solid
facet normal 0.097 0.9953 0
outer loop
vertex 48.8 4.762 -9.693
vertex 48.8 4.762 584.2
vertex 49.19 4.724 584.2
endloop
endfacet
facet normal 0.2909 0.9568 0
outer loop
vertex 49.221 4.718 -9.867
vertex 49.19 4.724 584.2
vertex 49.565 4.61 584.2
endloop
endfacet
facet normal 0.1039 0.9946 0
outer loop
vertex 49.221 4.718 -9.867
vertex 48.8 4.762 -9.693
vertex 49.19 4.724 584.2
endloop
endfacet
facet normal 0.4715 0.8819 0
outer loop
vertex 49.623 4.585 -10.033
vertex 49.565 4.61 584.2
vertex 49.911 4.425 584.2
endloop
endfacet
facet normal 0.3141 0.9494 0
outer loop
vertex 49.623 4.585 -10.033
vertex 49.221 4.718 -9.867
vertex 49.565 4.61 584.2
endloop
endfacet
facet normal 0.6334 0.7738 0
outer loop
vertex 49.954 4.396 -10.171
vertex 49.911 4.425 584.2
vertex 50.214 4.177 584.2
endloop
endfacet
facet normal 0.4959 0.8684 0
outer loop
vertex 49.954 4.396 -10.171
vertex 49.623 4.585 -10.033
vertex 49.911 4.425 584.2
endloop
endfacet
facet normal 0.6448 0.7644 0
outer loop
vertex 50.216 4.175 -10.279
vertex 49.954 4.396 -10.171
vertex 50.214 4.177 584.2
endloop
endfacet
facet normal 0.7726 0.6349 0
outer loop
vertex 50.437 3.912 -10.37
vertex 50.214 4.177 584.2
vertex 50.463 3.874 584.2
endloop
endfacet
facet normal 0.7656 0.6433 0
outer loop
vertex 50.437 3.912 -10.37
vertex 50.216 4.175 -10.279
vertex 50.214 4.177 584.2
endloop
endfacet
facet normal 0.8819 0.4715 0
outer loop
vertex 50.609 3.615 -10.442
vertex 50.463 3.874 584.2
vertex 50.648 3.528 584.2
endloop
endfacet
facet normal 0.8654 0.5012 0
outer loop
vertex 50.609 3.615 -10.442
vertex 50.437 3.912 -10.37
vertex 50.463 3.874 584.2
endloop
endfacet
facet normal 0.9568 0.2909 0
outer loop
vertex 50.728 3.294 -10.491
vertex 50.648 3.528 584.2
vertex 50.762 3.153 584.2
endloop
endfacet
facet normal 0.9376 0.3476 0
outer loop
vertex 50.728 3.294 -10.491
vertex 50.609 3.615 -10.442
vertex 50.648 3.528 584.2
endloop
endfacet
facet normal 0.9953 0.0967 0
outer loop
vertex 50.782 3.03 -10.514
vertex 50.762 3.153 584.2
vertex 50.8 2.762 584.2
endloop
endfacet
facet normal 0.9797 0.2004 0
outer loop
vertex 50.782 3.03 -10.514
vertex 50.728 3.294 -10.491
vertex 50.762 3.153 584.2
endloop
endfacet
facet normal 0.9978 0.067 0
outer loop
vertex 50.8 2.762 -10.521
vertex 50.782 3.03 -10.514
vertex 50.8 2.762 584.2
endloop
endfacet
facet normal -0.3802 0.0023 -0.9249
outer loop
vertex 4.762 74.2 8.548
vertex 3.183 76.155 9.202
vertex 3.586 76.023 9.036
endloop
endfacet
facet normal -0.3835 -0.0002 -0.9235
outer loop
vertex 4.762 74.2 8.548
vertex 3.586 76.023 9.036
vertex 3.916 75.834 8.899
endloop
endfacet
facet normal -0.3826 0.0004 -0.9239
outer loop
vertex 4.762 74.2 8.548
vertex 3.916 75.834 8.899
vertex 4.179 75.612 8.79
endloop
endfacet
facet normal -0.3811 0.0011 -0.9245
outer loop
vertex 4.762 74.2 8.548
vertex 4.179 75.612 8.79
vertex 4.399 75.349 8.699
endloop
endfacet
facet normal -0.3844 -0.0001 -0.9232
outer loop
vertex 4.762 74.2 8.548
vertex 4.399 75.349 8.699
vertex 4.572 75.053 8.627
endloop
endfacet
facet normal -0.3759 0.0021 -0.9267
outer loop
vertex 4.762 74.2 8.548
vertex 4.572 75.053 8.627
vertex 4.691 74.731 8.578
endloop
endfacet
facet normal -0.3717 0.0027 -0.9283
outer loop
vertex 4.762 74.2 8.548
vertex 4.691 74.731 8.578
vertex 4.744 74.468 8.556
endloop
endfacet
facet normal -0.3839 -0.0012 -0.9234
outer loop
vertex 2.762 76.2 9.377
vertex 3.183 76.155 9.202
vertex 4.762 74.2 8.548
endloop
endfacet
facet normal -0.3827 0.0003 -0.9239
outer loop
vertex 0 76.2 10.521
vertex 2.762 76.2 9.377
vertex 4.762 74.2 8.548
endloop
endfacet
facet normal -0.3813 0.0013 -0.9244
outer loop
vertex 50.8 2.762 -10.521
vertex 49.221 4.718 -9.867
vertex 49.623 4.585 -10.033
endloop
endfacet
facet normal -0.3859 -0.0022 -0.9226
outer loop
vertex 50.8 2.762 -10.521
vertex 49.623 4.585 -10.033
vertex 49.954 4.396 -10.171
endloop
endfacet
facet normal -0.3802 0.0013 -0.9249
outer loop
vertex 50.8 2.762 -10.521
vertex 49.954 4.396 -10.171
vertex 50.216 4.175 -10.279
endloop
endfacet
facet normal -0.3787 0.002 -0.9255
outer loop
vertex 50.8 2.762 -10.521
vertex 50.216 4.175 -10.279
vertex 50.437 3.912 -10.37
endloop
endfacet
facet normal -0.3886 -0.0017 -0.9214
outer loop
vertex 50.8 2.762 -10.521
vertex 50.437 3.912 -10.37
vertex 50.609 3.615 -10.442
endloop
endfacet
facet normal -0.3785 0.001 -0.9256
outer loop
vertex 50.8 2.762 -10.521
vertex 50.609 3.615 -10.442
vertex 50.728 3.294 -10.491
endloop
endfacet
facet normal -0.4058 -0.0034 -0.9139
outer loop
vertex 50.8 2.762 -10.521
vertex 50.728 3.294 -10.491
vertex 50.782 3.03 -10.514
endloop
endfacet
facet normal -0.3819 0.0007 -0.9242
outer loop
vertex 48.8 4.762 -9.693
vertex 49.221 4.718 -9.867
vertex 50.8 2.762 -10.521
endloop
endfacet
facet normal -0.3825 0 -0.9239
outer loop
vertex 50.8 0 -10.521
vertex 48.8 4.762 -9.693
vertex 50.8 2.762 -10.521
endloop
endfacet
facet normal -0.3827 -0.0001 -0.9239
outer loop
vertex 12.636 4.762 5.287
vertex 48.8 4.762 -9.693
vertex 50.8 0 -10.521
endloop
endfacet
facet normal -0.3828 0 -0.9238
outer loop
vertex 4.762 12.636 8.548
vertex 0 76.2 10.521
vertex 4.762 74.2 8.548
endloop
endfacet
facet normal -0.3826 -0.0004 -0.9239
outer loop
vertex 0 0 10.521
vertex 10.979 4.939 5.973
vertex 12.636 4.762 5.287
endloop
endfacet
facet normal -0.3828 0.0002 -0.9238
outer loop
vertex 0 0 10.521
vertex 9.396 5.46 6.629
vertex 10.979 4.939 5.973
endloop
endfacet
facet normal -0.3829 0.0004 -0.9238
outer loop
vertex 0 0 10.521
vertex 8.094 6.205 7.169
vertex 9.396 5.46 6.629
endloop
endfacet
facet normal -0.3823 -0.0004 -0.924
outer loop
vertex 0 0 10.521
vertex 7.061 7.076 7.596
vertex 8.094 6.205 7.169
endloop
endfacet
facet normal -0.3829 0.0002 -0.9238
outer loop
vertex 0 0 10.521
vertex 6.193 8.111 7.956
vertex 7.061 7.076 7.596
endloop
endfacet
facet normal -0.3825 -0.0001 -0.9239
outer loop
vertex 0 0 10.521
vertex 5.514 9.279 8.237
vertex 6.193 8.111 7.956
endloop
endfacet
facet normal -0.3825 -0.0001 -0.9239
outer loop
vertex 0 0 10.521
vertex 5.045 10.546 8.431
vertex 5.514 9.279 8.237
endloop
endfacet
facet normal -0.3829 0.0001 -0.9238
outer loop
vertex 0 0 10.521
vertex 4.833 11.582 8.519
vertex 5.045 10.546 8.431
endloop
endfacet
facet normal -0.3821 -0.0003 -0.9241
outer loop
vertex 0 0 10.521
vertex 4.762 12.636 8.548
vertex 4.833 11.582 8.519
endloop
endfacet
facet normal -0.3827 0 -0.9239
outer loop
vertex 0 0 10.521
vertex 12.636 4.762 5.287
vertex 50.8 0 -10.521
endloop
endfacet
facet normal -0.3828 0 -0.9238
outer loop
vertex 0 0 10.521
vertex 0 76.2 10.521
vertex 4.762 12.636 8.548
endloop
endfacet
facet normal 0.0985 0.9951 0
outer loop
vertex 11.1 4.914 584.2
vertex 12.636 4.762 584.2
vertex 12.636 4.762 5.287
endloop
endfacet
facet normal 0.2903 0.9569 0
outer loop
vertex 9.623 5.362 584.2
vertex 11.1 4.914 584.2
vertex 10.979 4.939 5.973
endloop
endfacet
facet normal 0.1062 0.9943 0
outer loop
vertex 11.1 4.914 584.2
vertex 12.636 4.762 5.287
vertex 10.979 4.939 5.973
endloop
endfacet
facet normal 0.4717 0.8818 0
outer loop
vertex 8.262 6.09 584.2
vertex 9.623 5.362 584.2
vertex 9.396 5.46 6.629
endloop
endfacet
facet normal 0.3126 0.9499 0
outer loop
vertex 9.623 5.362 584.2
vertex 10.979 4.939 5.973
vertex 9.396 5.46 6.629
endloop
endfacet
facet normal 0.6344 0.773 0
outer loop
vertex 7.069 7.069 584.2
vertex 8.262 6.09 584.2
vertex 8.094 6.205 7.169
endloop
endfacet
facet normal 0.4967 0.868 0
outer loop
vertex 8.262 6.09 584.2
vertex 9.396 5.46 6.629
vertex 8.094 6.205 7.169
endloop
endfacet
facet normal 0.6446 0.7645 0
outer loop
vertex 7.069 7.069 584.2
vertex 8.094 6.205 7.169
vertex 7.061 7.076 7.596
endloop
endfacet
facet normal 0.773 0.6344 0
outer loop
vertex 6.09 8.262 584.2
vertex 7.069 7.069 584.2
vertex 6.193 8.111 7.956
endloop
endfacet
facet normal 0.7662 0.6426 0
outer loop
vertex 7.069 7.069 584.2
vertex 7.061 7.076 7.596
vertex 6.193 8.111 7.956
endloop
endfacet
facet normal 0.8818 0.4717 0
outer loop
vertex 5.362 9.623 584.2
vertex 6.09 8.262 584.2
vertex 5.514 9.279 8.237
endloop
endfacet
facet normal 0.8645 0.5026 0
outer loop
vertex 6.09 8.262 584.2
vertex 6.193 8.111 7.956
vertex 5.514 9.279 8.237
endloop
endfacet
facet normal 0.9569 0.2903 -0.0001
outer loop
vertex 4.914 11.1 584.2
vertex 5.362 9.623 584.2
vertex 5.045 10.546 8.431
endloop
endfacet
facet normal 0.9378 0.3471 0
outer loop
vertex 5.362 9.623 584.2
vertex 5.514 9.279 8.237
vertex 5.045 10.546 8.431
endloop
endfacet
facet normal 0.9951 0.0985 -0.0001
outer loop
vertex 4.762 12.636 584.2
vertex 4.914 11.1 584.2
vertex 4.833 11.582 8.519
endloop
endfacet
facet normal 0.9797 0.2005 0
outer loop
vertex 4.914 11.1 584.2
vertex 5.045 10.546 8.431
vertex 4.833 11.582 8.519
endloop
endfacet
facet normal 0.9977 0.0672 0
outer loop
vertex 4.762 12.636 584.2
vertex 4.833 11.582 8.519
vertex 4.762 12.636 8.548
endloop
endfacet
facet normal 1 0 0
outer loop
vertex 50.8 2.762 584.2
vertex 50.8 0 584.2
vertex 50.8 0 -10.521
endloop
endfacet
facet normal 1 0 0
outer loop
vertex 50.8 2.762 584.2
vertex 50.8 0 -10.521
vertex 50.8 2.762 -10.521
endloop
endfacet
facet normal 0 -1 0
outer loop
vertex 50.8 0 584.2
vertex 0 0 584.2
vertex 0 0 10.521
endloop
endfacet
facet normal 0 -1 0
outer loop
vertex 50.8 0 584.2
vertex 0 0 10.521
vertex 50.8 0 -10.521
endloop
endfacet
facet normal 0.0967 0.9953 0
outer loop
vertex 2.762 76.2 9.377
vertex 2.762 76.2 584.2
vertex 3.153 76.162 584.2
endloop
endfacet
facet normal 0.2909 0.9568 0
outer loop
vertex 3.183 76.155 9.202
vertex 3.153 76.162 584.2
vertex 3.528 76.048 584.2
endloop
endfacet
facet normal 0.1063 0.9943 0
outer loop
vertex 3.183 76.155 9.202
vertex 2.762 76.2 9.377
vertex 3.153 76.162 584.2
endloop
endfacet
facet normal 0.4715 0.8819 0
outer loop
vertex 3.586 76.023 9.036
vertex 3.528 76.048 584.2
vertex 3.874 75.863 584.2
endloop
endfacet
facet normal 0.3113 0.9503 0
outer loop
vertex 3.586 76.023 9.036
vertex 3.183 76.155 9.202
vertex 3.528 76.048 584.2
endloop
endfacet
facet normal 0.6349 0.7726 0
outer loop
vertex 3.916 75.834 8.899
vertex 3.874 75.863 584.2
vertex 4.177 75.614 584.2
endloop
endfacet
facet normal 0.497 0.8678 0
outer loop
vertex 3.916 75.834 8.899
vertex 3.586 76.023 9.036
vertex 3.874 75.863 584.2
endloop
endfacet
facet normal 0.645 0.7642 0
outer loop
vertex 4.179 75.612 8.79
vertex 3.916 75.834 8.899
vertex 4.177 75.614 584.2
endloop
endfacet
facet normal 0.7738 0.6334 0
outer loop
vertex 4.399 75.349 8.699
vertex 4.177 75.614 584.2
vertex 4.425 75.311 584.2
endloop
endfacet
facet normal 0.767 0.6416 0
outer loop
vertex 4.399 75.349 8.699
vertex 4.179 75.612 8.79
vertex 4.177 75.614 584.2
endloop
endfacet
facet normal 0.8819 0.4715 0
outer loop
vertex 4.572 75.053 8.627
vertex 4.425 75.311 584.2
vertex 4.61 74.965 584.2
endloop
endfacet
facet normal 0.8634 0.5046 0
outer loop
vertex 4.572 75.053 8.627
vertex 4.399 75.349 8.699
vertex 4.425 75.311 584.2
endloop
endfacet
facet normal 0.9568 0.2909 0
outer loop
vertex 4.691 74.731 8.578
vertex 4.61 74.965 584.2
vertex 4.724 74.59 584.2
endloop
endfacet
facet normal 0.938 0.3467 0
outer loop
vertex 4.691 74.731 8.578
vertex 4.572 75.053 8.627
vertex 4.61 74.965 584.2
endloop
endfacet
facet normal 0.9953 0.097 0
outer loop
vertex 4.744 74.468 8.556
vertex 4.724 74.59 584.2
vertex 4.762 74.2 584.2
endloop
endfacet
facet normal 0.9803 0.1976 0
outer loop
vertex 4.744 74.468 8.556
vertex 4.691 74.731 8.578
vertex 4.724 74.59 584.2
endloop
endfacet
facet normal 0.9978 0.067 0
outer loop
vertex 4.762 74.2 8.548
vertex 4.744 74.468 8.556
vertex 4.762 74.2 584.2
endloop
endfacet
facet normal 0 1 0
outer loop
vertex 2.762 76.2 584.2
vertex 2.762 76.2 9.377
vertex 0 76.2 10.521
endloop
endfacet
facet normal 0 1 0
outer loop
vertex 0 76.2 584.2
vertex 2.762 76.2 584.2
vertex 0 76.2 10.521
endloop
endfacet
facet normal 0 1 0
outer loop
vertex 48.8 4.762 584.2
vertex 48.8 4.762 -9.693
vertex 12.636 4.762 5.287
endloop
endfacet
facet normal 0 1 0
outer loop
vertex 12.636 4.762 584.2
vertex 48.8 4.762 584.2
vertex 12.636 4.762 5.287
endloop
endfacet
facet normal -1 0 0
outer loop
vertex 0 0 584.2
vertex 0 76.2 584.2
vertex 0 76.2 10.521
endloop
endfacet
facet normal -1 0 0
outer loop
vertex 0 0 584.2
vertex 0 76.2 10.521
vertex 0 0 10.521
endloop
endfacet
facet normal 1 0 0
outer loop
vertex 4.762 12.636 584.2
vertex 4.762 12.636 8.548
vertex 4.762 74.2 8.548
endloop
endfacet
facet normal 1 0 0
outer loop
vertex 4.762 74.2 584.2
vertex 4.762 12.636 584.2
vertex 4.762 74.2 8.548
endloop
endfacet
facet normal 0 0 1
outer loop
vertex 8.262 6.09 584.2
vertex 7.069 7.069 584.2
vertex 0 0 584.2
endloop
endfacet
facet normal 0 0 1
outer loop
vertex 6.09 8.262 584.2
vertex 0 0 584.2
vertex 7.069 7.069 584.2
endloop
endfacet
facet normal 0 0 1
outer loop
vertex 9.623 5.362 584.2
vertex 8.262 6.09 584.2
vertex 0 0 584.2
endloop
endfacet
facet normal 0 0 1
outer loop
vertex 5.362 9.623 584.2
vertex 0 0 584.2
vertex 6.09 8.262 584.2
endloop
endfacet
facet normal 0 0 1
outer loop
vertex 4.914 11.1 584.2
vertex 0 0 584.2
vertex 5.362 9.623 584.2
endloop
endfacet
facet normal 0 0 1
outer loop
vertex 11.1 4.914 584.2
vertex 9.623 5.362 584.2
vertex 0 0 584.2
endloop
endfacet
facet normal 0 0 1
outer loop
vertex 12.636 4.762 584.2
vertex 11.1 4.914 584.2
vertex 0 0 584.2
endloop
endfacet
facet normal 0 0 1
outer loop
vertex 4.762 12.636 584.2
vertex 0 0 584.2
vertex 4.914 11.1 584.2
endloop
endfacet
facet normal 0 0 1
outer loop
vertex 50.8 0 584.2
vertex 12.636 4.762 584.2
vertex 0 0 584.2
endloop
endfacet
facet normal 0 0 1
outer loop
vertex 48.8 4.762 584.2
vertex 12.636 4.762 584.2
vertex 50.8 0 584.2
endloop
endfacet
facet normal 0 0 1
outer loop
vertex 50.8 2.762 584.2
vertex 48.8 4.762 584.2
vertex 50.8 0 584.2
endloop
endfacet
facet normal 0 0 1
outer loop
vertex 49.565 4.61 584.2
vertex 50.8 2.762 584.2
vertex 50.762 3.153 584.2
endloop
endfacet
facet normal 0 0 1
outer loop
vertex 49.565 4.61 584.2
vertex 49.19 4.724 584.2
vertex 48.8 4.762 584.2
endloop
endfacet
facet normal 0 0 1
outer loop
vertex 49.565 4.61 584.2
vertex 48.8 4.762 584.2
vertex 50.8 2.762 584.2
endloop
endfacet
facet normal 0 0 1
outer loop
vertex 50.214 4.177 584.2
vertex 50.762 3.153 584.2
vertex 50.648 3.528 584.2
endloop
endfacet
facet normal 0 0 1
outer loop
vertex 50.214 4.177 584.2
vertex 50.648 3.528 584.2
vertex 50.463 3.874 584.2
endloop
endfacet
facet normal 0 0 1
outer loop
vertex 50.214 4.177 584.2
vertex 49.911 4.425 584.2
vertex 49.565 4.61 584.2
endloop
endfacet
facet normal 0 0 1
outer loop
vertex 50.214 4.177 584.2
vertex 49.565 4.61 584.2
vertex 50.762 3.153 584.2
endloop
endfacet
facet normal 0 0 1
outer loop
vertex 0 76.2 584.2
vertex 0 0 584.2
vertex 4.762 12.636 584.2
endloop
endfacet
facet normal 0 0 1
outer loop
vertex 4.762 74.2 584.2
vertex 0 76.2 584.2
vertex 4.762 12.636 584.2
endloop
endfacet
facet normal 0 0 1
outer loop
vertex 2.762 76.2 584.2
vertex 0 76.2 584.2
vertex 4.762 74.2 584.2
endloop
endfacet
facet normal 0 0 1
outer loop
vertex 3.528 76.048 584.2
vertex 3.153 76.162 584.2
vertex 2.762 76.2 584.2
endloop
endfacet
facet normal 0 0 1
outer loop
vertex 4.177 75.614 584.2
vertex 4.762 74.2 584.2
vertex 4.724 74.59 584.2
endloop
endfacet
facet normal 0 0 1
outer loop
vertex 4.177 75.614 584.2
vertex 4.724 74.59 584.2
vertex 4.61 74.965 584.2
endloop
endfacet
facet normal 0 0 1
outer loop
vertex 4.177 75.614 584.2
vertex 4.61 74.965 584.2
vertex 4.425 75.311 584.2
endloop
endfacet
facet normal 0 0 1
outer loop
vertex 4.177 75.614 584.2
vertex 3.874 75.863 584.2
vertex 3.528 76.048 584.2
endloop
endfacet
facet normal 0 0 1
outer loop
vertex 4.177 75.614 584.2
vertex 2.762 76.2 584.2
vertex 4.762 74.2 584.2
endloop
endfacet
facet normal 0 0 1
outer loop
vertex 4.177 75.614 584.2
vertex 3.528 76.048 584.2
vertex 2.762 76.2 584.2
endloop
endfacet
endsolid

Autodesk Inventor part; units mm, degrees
ref_plane "Start plane" through (0, 0, -10.521) normal (0, 0, 1) x (1, 0, 0)
ref_plane "End plane" through (0, 0, 584.2) normal (0, 0, 1) x (1, 0, 0)
sketch "Sketch" plane through (0, 0, 0) normal (0, 0, 1) x (1, 0, 0)
  line L0 (0, 76.2) -> (0, 0)
  line L1 (0, 0) -> (50.8, 0)
  line L2 (50.8, 0) -> (50.8, 2.7625)
  line L3 (48.8, 4.7625) -> (12.6365, 4.7625)
  line L4 (4.7625, 12.6365) -> (4.7625, 74.2)
  line L5 (2.7625, 76.2) -> (0, 76.2)
  line L6 (-7.0414, 0) -> (21.5385, 0) construction
  line L7 (0, -8.0414) -> (0, 34.5385) construction
  arc A0 (4.7625, 12.6365) -> (12.6365, 4.7625) centre (12.6365, 12.6365) ccw
  arc A1 (50.8, 2.7625) -> (48.8, 4.7625) centre (48.8, 2.7625) ccw
  arc A2 (4.7625, 74.2) -> (2.7625, 76.2) centre (2.7625, 74.2) ccw
  line L8 (0, 93.5453) -> (0, -24.9725) construction
  line L9 (-18.6925, 0) -> (62.8653, 0) construction
  point P0 (50.8, 4.7625)
  point P1 (4.7625, 4.7625)
  point P2 (4.7625, 76.2)
  dimension "d12" = 4.7625
  dimension "d13" = 76.2
  dimension "d14" = 50.8
  dimension "d15" = 0
  dimension "d16" = 4.7625
  dimension "d17" = 0
  dimension "d18" = 7.874
  dimension "d19" = 2
extrude "Body" add sketch "Sketch" along normal up to surface (594.721 mm away) from surface at -10.521
sketch "Sketch3" plane through (0, 0, 0) normal (0, 0, 1) x (1, 0, 0)
  line L0 (0, 0) -> (10, 0)
ref_plane "Work Plane5" through (0, 0, 0) normal (0, -1, 0) x (1, 0, 0)
sketch "Sketch4" plane through (0, 0, 0) normal (0, -1, 0) x (1, 0, 0)
  line L0 (-2, -10.521) -> (12, -10.521)
  line L1 (-2, 584.2) -> (12, 584.2)
  dimension "d23" = 594.721
ref_plane "Work Plane3" through (50.8, 38.1, -10.521) normal (-0.3827, 0, -0.9239) x (-0.9239, 0, 0.3827)
split "Split1" plane through (50.8, 38.1, -10.521) removes the side toward (-0.3827, 0, -0.9239)
ref_plane "Work Plane4" through (130.175, 0, 584.2) normal (0, 0, 1) x (1, 0, 0)
split "Split2" plane through (130.175, 0, 584.2) removes the side toward (0, 0, 1)
equation "\"d12\" = G_T"
equation "\"d13\" = G_H"
equation "\"d14\" = G_W"
equation "\"d16\" = G_T"
equation "\"d18\" = G_IR"
equation "\"d4\" = G_L"
equation "\"G_W\" = 50.8"
equation "\"G_H\" = 76.2"
equation "\"G_T\" = 4.7625"
equation "\"G_ER\" = 4.064"
equation "\"G_IR\" = 7.874"
equation "\"G_L\" = d23"
equation "\"ex\" = 0"
equation "\"ey\" = 0"
equation "\"G_OFFSET_START\" = 10.52102"
equation "\"G_OFFSET_END\" = -25.4"
equation "\"d20\" = -G_OFFSET_START"
equation "\"d21\" = G_OFFSET_END + B_L"
equation "\"B_L\" = 609.6"
properties part number "ANSI L 3 x 2 x 3_16 00000003"
